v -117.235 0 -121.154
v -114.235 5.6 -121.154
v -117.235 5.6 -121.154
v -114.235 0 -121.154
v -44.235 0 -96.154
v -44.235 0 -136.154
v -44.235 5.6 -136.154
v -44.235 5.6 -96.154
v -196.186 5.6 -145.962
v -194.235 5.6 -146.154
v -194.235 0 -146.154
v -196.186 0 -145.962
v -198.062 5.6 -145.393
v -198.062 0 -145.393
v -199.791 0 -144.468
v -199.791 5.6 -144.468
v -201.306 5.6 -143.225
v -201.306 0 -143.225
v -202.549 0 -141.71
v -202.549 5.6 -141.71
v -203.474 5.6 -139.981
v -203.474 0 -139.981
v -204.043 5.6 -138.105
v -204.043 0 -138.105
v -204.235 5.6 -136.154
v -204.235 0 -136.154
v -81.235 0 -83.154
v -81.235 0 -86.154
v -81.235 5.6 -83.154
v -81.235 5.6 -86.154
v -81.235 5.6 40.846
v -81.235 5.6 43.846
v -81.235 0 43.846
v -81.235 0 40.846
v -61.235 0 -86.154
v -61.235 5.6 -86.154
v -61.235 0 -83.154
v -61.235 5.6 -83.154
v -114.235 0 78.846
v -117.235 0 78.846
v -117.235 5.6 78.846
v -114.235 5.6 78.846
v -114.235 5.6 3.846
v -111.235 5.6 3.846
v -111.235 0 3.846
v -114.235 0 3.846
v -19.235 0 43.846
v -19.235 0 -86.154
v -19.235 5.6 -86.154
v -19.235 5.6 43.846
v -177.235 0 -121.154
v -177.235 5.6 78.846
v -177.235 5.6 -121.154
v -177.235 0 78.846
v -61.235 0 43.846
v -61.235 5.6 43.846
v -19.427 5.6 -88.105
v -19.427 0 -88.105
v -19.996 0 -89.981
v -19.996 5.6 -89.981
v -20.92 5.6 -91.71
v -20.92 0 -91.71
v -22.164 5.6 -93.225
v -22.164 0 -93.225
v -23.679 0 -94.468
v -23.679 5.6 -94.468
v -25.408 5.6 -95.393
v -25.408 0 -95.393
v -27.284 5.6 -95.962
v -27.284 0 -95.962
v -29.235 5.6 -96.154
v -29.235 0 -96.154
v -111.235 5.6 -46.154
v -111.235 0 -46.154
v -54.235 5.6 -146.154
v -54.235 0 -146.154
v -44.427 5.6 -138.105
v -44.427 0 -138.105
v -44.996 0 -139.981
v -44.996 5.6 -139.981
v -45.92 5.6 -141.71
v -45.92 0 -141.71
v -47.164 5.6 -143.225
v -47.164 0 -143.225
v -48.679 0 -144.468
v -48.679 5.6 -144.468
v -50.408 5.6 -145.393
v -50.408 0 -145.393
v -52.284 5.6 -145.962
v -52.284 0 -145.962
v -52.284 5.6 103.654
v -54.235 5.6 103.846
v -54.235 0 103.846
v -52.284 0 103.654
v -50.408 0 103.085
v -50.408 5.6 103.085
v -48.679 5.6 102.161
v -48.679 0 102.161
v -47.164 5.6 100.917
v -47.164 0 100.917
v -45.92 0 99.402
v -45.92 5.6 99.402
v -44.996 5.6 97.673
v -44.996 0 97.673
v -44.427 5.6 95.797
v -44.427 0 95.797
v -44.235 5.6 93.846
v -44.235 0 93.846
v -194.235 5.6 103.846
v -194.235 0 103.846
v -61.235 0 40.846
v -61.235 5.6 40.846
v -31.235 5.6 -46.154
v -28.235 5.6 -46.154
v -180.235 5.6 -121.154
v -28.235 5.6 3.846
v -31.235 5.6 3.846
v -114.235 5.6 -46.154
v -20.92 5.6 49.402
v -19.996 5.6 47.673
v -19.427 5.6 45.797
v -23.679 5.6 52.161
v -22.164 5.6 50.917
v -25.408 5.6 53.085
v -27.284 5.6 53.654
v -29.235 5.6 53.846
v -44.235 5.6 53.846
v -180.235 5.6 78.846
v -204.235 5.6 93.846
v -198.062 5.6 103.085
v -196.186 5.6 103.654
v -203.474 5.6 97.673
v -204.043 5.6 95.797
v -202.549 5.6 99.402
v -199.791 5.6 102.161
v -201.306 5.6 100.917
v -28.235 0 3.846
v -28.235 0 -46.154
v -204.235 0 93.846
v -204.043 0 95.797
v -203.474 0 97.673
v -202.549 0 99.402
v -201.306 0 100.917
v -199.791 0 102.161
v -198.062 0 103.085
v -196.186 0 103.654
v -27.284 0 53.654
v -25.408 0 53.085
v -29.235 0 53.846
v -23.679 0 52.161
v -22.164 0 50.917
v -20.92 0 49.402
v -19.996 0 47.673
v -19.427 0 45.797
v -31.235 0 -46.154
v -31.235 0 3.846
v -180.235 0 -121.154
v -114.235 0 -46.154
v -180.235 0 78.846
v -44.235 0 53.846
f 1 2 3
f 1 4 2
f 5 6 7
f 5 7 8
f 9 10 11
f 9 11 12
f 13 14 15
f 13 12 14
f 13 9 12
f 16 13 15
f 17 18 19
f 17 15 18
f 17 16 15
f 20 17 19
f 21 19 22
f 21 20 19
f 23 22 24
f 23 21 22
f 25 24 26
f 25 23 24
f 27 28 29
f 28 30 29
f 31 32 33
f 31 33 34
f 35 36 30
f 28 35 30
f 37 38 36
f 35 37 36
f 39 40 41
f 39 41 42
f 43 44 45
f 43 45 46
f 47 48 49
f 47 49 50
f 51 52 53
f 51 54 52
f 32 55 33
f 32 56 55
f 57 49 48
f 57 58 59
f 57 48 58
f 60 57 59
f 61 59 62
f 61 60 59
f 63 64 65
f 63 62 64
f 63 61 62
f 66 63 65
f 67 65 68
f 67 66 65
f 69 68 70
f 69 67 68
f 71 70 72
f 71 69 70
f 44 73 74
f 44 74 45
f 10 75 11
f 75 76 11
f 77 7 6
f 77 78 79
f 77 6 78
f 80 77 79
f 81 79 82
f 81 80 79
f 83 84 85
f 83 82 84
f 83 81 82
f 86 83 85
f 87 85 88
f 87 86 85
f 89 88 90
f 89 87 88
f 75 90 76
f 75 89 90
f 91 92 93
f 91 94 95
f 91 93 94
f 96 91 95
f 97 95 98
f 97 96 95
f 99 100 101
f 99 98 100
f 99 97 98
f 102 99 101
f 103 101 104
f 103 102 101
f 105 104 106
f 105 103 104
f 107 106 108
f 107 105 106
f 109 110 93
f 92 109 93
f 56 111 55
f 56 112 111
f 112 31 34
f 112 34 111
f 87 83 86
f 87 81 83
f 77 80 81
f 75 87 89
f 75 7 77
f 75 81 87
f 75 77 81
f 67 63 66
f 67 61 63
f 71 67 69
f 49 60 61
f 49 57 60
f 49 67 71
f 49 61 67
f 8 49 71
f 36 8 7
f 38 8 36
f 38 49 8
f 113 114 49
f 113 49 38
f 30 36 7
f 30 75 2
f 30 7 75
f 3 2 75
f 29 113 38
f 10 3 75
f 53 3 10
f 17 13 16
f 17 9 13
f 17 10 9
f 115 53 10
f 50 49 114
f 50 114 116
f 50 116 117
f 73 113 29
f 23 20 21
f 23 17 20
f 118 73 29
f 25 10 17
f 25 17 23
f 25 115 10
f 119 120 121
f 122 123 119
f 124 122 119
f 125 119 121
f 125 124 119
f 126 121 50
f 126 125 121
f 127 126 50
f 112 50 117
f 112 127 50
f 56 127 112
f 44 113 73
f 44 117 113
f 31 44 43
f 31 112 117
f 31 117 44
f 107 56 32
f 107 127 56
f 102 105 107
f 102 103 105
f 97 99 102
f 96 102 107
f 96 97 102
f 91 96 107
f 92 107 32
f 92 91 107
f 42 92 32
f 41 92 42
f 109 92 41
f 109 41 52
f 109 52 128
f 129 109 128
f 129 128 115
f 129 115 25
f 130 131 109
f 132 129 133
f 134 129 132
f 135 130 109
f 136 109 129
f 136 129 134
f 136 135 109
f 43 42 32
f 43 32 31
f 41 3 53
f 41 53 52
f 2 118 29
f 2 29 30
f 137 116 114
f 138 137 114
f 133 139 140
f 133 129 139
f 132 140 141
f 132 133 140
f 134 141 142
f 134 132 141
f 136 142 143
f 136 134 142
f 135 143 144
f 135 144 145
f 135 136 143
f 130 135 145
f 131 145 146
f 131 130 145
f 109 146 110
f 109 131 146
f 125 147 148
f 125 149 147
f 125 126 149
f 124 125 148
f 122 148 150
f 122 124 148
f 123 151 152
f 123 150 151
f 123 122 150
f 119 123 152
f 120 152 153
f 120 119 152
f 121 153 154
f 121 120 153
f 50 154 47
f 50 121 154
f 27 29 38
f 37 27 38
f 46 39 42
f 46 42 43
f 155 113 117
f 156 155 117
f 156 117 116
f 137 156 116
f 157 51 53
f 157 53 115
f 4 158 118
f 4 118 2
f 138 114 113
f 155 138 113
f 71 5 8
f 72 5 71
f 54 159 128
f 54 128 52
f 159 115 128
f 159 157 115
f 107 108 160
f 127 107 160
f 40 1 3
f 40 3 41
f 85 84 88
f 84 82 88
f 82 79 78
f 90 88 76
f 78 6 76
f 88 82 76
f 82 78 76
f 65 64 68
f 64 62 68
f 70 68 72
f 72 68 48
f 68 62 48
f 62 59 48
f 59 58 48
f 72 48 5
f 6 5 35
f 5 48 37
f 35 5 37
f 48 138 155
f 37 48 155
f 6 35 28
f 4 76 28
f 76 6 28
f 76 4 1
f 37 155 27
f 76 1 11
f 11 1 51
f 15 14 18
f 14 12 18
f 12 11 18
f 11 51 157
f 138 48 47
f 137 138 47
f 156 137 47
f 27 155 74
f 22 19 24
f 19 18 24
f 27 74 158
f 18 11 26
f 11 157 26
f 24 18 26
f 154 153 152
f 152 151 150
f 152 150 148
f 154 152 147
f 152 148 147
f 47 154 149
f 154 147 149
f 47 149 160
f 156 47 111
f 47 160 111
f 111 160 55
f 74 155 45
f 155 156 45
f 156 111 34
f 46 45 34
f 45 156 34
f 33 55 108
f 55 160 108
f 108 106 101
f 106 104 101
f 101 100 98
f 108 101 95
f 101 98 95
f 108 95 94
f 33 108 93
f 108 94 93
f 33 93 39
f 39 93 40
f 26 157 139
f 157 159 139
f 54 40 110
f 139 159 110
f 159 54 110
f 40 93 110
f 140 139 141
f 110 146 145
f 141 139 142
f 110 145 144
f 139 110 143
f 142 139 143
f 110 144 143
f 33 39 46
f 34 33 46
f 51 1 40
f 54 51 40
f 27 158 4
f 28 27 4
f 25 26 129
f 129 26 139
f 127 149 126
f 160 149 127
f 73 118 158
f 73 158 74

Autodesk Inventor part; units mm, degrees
ref_plane "YZ Plane" through (0, 0, 0) normal (1, 0, 0) x (0, 1, 0)
ref_plane "XZ Plane" through (0, 0, 0) normal (0, 1, 0) x (-1, 0, 0)
ref_plane "XY Plane" through (0, 0, 0) normal (0, 0, 1) x (1, 0, 0)
sketch "Sketch1" plane through (0, 0, 0) normal (0, 1, 0) x (-1, 0, 0)
  line L0 (204.2348, 103.8462) -> (44.2348, 103.8462)
  line L1 (44.2348, 103.8462) -> (44.2348, -146.1538) construction
  line L2 (44.2348, -146.1538) -> (204.2348, -146.1538)
  line L3 (204.2348, -146.1538) -> (204.2348, 103.8462)
  line L4 (124.2348, 103.8462) -> (124.2348, -146.1538) construction
  line L5 (204.2348, -21.1538) -> (44.2348, -21.1538) construction
  line L6 (180.2348, 78.8462) -> (177.2348, 78.8462)
  line L7 (177.2348, 78.8462) -> (177.2348, -121.1538)
  line L8 (177.2348, -121.1538) -> (180.2348, -121.1538)
  line L9 (180.2348, -121.1538) -> (180.2348, 78.8462)
  line L10 (117.2348, 78.8462) -> (114.2348, 78.8462)
  line L11 (114.2348, 78.8462) -> (114.2348, -121.1538)
  line L12 (114.2348, -121.1538) -> (117.2348, -121.1538)
  line L13 (117.2348, -121.1538) -> (117.2348, 78.8462)
  line L14 (44.2348, -146.1538) -> (44.2348, -96.1538)
  line L15 (44.2348, 103.8462) -> (44.2348, 53.8462)
  line L16 (44.2348, -96.1538) -> (19.2348, -96.1538)
  line L17 (19.2348, -96.1538) -> (19.2348, 53.8462)
  line L18 (19.2348, 53.8462) -> (44.2348, 53.8462)
  point P0 (0, 0)
  dimension "d0" = 160
  dimension "d1" = 250
  dimension "d2" = 3
  dimension "d3" = 3
  dimension "d4" = 200
  dimension "d7" = 60
  dimension "d9" = 150
  dimension "d10" = 25
  dimension "d27" = 70
extrude "Extrusion2" add sketch "Sketch1" along normal blind 5.6
fillet "Fillet2" radius 10 6 edges at (-19.2348, 2.8, 53.8462) (-19.2348, 2.8, -96.1538) (-44.2348, 2.8, 103.8462) (-44.2348, 2.8, -146.1538) (-204.2348, 2.8, -146.1538) (-204.2348, 2.8, 103.8462)
sketch "Sketch3" plane through (0, 5.6, 0) normal (0, 1, 0) x (1, 0, 0)
  line L0 (-114.2348, 121.1538) -> (-114.2348, -78.8462) projected
  line L1 (-114.2348, 21.1538) -> (-19.2348, 21.1538) construction
  line L2 (-19.2348, -43.8462) -> (-19.2348, 86.1538) projected
  line L3 (-114.2348, 46.1538) -> (-111.2348, 46.1538)
  line L4 (-111.2348, 46.1538) -> (-111.2348, -3.8462)
  line L5 (-111.2348, -3.8462) -> (-114.2348, -3.8462)
  line L6 (-81.2348, 86.1538) -> (-81.2348, 83.1538)
  line L7 (-81.2348, 83.1538) -> (-61.2348, 83.1538)
  line L8 (-61.2348, 83.1538) -> (-61.2348, 86.1538)
  line L9 (-61.2348, 86.1538) -> (-81.2348, 86.1538)
  line L10 (-61.2348, -43.8462) -> (-81.2348, -43.8462)
  line L11 (-81.2348, -43.8462) -> (-81.2348, -40.8462)
  line L12 (-81.2348, -40.8462) -> (-61.2348, -40.8462)
  line L13 (-61.2348, -40.8462) -> (-61.2348, -43.8462)
  line L14 (-31.2348, 46.1538) -> (-31.2348, -3.8462)
  line L15 (-31.2348, -3.8462) -> (-28.2348, -3.8462)
  line L16 (-28.2348, -3.8462) -> (-28.2348, 46.1538)
  line L17 (-28.2348, 46.1538) -> (-31.2348, 46.1538)
  line L18 (-111.2348, 13.6812) -> (-31.2348, 13.6812) construction
  line L19 (-71.2348, 13.6812) -> (-71.2348, 32.3126) construction
  point P0 (0, 0)
  point P1 (-81.2348, -42.3462)
  dimension "d28" = 3
  dimension "d29" = 50
  dimension "d30" = 3
  dimension "d31" = 3
  dimension "d32" = 20
  dimension "d34" = 3
  dimension "d38" = 80
extrude "Extrusion4" cut sketch "Sketch3" against normal blind 10
equation "\"d0\" = BaseDepth"
equation "\"d1\" = BaseLength"
equation "\"d2\" = Width"
equation "\"d3\" = Width"
equation "\"d4\" = SlotLength"
equation "\"d28\" = Width"
equation "\"d30\" = Width"
equation "\"d31\" = Width"
equation "\"d34\" = Width"
equation "\"BaseDepth\" = 160"
equation "\"BaseLength\" = 250"
equation "\"Width\" = 3"
equation "\"SlotLength\" = 200"
properties part number "Base" material "ABS Plastic"
